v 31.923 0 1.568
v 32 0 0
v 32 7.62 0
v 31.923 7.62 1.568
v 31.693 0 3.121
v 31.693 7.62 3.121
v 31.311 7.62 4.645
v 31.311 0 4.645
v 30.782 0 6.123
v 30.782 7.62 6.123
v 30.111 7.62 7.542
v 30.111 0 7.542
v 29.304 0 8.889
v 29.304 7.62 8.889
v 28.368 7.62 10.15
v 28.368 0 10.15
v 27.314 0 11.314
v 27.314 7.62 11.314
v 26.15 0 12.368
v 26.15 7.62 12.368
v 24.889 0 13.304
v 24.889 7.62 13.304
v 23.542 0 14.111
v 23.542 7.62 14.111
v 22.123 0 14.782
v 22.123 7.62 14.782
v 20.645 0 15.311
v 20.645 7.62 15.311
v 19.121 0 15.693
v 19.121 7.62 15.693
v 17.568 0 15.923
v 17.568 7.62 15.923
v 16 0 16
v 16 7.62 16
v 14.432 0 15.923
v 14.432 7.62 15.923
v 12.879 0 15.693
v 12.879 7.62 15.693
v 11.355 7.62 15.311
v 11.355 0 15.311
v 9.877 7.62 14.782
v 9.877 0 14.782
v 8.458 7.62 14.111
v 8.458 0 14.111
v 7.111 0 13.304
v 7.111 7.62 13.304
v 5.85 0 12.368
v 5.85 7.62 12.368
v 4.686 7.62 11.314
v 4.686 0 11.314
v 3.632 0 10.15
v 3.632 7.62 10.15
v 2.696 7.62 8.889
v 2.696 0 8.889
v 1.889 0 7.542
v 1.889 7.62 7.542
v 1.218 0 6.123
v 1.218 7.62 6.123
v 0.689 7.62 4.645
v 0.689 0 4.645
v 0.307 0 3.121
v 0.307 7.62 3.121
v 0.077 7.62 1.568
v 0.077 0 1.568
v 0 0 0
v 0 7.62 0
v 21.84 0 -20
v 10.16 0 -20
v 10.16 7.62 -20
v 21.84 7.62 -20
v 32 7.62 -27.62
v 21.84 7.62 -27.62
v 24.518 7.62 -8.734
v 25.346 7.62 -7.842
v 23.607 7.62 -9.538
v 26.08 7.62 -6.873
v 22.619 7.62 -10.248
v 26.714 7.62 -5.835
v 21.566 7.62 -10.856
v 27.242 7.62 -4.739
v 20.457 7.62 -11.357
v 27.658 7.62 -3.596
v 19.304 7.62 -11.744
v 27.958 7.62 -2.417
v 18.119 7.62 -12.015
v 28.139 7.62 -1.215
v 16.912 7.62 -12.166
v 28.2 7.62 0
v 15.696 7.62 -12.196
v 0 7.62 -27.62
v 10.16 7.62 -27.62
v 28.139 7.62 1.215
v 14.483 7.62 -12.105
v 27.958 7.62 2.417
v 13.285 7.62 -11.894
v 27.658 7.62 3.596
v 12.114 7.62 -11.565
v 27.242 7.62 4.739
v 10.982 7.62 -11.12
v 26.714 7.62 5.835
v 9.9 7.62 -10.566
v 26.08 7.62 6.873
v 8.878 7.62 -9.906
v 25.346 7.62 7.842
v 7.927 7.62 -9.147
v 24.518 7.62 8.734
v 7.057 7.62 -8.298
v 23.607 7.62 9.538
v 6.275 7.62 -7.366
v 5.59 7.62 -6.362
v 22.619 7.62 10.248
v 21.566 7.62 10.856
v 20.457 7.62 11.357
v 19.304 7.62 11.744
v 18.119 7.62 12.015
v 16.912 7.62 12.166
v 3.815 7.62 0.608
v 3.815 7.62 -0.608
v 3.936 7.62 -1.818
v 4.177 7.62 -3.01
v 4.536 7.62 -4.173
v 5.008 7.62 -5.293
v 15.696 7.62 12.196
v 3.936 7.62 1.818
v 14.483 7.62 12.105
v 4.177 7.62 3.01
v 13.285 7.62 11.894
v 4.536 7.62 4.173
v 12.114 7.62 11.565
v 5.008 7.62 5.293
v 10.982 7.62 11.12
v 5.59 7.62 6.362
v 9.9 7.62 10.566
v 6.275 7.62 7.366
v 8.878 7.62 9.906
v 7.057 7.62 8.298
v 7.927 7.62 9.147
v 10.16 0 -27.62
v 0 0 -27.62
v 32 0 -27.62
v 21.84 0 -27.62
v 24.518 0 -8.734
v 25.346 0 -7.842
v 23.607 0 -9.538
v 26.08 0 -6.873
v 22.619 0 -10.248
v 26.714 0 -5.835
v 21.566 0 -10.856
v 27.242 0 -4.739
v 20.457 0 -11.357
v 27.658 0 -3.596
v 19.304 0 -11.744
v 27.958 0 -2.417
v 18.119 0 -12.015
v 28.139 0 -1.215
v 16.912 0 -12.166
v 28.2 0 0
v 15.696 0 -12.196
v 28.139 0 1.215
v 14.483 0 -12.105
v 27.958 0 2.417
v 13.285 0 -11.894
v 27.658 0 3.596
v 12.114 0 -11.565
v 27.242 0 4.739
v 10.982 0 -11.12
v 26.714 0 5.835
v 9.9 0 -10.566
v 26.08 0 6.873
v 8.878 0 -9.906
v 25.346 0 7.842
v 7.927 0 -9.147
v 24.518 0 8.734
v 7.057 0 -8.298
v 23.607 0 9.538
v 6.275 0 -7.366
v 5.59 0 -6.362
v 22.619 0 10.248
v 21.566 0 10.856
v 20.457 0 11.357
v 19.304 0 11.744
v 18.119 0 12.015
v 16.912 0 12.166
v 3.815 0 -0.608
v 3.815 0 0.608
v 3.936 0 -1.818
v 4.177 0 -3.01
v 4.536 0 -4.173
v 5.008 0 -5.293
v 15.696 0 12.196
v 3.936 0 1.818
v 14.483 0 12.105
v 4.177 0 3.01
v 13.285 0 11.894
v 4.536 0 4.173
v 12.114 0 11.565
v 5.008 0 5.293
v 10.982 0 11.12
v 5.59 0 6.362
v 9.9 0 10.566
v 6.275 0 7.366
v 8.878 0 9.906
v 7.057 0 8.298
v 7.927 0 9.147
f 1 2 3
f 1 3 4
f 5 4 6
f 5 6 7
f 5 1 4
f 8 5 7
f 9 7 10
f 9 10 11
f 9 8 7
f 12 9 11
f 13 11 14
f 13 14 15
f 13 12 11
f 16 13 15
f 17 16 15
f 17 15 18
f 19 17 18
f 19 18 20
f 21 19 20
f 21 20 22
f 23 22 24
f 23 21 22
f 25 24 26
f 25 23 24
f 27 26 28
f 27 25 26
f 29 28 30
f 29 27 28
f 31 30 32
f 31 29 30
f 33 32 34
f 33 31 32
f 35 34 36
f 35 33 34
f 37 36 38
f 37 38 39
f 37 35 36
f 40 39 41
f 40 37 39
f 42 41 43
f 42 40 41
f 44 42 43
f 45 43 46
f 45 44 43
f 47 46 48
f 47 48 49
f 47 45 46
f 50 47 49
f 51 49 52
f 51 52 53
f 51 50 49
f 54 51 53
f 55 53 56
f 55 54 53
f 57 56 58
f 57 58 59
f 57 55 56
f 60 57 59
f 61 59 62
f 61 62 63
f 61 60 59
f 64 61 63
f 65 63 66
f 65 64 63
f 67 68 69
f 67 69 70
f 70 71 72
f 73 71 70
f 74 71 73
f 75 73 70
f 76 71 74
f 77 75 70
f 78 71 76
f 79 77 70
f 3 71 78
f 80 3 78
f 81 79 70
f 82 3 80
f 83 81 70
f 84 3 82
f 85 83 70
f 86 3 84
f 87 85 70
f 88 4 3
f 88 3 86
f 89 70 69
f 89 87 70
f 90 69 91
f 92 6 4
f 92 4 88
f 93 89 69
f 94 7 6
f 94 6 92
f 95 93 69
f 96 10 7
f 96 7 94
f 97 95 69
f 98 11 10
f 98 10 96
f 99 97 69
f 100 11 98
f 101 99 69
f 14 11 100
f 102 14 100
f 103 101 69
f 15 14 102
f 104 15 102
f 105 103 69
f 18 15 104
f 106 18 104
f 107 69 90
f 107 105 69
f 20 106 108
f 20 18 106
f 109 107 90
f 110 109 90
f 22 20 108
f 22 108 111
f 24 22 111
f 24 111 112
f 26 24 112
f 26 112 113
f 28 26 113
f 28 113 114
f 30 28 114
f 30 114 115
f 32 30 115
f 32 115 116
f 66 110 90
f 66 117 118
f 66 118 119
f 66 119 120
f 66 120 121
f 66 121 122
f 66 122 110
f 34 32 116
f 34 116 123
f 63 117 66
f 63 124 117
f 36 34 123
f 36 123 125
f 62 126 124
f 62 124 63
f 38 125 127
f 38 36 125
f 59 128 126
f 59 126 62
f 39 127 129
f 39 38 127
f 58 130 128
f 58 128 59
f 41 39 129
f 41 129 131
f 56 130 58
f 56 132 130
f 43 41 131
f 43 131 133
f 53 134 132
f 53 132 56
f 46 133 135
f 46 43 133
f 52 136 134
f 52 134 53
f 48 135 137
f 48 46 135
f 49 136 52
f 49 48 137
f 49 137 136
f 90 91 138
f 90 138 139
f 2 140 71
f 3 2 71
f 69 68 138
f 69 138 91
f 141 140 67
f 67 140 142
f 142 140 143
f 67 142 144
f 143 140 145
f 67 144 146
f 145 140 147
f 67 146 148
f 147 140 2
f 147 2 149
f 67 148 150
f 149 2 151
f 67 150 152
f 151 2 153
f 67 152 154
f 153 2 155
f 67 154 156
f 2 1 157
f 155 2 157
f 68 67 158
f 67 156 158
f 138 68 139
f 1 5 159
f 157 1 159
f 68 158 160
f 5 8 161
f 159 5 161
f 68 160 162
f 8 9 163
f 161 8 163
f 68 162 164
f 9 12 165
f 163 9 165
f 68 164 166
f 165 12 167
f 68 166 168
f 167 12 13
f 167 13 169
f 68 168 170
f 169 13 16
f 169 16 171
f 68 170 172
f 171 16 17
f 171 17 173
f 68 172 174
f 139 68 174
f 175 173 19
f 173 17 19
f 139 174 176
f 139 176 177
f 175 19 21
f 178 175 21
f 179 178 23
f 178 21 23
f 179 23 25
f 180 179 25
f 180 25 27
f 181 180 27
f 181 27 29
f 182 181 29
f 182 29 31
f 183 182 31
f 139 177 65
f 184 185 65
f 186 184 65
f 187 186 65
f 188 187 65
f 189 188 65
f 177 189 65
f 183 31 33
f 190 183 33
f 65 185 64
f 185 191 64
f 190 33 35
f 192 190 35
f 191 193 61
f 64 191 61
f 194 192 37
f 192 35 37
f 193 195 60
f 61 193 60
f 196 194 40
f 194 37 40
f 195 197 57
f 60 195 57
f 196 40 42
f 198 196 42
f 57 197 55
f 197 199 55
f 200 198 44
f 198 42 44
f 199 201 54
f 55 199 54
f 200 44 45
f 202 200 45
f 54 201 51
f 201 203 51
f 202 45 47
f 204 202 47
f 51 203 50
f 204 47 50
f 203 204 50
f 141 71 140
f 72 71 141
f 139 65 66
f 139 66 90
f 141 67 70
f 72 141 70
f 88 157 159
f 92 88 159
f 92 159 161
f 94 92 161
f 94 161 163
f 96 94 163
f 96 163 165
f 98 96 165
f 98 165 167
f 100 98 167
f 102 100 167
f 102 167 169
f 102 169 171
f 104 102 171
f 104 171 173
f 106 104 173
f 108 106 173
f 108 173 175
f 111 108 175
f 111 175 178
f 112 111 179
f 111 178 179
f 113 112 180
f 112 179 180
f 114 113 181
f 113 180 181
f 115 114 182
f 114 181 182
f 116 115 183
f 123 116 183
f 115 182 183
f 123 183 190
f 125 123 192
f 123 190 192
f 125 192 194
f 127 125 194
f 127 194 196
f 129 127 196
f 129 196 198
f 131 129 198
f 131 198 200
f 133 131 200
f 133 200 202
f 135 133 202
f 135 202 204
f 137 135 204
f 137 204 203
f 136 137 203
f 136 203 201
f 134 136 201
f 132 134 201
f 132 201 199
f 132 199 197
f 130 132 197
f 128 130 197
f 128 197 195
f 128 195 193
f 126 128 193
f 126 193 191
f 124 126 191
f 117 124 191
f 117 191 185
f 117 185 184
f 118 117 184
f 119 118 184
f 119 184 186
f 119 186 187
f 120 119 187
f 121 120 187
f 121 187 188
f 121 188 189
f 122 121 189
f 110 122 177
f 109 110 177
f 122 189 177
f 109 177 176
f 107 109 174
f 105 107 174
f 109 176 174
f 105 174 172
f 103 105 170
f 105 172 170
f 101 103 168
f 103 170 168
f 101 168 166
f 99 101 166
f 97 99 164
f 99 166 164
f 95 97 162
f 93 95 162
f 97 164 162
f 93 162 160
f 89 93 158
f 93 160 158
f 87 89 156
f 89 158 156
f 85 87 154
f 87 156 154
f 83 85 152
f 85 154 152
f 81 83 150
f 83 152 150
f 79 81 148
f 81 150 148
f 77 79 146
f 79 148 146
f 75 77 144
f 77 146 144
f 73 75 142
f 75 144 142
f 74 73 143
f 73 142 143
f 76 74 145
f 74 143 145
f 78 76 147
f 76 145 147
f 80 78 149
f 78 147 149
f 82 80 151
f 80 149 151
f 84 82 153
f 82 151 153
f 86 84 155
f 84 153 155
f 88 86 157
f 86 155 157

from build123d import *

# Parameters (mm, degrees)
BOSS_EXTRUDE1_DEPTH = 7.62
SKETCH2_R           = 12.2
CUT_EXTRUDE1_DEPTH  = 8.62
SKETCH3_W           = 10.16
SKETCH3_H           = 7.62
BOSS_EXTRUDE2_DEPTH = 7.62


with BuildPart() as part:
    # Sketch1 → Boss-Extrude1 (new body)
    with BuildSketch(Plane(origin=(0, 0, 0), x_dir=(1, 0, 0), z_dir=(0, 1, 0))):
        with BuildLine():
            Line((0, 0), (0, 20))
            Line((0, 20), (32, 20))
            Line((32, 20), (32, 0))
            ThreePointArc((32, 0), (16, -16), (0, 0))
        make_face()
    extrude(amount=BOSS_EXTRUDE1_DEPTH)

    # Sketch2 → Cut-Extrude1 (cut, through all)
    with BuildSketch(Plane.XZ):
        with Locations((16, 0)):
            Circle(SKETCH2_R)
    extrude(amount=-CUT_EXTRUDE1_DEPTH, mode=Mode.SUBTRACT)

    # Sketch3 → Boss-Extrude2 (add)
    with BuildSketch(Plane(origin=(0, 0, -20), x_dir=(-1, 0, 0), z_dir=(0, 0, -1))):
        with Locations((-26.92, 3.81)):
            Rectangle(SKETCH3_W, SKETCH3_H)
        with Locations((-5.08, 3.81)):
            Rectangle(SKETCH3_W, SKETCH3_H)
    extrude(amount=BOSS_EXTRUDE2_DEPTH)


solid = part.part
